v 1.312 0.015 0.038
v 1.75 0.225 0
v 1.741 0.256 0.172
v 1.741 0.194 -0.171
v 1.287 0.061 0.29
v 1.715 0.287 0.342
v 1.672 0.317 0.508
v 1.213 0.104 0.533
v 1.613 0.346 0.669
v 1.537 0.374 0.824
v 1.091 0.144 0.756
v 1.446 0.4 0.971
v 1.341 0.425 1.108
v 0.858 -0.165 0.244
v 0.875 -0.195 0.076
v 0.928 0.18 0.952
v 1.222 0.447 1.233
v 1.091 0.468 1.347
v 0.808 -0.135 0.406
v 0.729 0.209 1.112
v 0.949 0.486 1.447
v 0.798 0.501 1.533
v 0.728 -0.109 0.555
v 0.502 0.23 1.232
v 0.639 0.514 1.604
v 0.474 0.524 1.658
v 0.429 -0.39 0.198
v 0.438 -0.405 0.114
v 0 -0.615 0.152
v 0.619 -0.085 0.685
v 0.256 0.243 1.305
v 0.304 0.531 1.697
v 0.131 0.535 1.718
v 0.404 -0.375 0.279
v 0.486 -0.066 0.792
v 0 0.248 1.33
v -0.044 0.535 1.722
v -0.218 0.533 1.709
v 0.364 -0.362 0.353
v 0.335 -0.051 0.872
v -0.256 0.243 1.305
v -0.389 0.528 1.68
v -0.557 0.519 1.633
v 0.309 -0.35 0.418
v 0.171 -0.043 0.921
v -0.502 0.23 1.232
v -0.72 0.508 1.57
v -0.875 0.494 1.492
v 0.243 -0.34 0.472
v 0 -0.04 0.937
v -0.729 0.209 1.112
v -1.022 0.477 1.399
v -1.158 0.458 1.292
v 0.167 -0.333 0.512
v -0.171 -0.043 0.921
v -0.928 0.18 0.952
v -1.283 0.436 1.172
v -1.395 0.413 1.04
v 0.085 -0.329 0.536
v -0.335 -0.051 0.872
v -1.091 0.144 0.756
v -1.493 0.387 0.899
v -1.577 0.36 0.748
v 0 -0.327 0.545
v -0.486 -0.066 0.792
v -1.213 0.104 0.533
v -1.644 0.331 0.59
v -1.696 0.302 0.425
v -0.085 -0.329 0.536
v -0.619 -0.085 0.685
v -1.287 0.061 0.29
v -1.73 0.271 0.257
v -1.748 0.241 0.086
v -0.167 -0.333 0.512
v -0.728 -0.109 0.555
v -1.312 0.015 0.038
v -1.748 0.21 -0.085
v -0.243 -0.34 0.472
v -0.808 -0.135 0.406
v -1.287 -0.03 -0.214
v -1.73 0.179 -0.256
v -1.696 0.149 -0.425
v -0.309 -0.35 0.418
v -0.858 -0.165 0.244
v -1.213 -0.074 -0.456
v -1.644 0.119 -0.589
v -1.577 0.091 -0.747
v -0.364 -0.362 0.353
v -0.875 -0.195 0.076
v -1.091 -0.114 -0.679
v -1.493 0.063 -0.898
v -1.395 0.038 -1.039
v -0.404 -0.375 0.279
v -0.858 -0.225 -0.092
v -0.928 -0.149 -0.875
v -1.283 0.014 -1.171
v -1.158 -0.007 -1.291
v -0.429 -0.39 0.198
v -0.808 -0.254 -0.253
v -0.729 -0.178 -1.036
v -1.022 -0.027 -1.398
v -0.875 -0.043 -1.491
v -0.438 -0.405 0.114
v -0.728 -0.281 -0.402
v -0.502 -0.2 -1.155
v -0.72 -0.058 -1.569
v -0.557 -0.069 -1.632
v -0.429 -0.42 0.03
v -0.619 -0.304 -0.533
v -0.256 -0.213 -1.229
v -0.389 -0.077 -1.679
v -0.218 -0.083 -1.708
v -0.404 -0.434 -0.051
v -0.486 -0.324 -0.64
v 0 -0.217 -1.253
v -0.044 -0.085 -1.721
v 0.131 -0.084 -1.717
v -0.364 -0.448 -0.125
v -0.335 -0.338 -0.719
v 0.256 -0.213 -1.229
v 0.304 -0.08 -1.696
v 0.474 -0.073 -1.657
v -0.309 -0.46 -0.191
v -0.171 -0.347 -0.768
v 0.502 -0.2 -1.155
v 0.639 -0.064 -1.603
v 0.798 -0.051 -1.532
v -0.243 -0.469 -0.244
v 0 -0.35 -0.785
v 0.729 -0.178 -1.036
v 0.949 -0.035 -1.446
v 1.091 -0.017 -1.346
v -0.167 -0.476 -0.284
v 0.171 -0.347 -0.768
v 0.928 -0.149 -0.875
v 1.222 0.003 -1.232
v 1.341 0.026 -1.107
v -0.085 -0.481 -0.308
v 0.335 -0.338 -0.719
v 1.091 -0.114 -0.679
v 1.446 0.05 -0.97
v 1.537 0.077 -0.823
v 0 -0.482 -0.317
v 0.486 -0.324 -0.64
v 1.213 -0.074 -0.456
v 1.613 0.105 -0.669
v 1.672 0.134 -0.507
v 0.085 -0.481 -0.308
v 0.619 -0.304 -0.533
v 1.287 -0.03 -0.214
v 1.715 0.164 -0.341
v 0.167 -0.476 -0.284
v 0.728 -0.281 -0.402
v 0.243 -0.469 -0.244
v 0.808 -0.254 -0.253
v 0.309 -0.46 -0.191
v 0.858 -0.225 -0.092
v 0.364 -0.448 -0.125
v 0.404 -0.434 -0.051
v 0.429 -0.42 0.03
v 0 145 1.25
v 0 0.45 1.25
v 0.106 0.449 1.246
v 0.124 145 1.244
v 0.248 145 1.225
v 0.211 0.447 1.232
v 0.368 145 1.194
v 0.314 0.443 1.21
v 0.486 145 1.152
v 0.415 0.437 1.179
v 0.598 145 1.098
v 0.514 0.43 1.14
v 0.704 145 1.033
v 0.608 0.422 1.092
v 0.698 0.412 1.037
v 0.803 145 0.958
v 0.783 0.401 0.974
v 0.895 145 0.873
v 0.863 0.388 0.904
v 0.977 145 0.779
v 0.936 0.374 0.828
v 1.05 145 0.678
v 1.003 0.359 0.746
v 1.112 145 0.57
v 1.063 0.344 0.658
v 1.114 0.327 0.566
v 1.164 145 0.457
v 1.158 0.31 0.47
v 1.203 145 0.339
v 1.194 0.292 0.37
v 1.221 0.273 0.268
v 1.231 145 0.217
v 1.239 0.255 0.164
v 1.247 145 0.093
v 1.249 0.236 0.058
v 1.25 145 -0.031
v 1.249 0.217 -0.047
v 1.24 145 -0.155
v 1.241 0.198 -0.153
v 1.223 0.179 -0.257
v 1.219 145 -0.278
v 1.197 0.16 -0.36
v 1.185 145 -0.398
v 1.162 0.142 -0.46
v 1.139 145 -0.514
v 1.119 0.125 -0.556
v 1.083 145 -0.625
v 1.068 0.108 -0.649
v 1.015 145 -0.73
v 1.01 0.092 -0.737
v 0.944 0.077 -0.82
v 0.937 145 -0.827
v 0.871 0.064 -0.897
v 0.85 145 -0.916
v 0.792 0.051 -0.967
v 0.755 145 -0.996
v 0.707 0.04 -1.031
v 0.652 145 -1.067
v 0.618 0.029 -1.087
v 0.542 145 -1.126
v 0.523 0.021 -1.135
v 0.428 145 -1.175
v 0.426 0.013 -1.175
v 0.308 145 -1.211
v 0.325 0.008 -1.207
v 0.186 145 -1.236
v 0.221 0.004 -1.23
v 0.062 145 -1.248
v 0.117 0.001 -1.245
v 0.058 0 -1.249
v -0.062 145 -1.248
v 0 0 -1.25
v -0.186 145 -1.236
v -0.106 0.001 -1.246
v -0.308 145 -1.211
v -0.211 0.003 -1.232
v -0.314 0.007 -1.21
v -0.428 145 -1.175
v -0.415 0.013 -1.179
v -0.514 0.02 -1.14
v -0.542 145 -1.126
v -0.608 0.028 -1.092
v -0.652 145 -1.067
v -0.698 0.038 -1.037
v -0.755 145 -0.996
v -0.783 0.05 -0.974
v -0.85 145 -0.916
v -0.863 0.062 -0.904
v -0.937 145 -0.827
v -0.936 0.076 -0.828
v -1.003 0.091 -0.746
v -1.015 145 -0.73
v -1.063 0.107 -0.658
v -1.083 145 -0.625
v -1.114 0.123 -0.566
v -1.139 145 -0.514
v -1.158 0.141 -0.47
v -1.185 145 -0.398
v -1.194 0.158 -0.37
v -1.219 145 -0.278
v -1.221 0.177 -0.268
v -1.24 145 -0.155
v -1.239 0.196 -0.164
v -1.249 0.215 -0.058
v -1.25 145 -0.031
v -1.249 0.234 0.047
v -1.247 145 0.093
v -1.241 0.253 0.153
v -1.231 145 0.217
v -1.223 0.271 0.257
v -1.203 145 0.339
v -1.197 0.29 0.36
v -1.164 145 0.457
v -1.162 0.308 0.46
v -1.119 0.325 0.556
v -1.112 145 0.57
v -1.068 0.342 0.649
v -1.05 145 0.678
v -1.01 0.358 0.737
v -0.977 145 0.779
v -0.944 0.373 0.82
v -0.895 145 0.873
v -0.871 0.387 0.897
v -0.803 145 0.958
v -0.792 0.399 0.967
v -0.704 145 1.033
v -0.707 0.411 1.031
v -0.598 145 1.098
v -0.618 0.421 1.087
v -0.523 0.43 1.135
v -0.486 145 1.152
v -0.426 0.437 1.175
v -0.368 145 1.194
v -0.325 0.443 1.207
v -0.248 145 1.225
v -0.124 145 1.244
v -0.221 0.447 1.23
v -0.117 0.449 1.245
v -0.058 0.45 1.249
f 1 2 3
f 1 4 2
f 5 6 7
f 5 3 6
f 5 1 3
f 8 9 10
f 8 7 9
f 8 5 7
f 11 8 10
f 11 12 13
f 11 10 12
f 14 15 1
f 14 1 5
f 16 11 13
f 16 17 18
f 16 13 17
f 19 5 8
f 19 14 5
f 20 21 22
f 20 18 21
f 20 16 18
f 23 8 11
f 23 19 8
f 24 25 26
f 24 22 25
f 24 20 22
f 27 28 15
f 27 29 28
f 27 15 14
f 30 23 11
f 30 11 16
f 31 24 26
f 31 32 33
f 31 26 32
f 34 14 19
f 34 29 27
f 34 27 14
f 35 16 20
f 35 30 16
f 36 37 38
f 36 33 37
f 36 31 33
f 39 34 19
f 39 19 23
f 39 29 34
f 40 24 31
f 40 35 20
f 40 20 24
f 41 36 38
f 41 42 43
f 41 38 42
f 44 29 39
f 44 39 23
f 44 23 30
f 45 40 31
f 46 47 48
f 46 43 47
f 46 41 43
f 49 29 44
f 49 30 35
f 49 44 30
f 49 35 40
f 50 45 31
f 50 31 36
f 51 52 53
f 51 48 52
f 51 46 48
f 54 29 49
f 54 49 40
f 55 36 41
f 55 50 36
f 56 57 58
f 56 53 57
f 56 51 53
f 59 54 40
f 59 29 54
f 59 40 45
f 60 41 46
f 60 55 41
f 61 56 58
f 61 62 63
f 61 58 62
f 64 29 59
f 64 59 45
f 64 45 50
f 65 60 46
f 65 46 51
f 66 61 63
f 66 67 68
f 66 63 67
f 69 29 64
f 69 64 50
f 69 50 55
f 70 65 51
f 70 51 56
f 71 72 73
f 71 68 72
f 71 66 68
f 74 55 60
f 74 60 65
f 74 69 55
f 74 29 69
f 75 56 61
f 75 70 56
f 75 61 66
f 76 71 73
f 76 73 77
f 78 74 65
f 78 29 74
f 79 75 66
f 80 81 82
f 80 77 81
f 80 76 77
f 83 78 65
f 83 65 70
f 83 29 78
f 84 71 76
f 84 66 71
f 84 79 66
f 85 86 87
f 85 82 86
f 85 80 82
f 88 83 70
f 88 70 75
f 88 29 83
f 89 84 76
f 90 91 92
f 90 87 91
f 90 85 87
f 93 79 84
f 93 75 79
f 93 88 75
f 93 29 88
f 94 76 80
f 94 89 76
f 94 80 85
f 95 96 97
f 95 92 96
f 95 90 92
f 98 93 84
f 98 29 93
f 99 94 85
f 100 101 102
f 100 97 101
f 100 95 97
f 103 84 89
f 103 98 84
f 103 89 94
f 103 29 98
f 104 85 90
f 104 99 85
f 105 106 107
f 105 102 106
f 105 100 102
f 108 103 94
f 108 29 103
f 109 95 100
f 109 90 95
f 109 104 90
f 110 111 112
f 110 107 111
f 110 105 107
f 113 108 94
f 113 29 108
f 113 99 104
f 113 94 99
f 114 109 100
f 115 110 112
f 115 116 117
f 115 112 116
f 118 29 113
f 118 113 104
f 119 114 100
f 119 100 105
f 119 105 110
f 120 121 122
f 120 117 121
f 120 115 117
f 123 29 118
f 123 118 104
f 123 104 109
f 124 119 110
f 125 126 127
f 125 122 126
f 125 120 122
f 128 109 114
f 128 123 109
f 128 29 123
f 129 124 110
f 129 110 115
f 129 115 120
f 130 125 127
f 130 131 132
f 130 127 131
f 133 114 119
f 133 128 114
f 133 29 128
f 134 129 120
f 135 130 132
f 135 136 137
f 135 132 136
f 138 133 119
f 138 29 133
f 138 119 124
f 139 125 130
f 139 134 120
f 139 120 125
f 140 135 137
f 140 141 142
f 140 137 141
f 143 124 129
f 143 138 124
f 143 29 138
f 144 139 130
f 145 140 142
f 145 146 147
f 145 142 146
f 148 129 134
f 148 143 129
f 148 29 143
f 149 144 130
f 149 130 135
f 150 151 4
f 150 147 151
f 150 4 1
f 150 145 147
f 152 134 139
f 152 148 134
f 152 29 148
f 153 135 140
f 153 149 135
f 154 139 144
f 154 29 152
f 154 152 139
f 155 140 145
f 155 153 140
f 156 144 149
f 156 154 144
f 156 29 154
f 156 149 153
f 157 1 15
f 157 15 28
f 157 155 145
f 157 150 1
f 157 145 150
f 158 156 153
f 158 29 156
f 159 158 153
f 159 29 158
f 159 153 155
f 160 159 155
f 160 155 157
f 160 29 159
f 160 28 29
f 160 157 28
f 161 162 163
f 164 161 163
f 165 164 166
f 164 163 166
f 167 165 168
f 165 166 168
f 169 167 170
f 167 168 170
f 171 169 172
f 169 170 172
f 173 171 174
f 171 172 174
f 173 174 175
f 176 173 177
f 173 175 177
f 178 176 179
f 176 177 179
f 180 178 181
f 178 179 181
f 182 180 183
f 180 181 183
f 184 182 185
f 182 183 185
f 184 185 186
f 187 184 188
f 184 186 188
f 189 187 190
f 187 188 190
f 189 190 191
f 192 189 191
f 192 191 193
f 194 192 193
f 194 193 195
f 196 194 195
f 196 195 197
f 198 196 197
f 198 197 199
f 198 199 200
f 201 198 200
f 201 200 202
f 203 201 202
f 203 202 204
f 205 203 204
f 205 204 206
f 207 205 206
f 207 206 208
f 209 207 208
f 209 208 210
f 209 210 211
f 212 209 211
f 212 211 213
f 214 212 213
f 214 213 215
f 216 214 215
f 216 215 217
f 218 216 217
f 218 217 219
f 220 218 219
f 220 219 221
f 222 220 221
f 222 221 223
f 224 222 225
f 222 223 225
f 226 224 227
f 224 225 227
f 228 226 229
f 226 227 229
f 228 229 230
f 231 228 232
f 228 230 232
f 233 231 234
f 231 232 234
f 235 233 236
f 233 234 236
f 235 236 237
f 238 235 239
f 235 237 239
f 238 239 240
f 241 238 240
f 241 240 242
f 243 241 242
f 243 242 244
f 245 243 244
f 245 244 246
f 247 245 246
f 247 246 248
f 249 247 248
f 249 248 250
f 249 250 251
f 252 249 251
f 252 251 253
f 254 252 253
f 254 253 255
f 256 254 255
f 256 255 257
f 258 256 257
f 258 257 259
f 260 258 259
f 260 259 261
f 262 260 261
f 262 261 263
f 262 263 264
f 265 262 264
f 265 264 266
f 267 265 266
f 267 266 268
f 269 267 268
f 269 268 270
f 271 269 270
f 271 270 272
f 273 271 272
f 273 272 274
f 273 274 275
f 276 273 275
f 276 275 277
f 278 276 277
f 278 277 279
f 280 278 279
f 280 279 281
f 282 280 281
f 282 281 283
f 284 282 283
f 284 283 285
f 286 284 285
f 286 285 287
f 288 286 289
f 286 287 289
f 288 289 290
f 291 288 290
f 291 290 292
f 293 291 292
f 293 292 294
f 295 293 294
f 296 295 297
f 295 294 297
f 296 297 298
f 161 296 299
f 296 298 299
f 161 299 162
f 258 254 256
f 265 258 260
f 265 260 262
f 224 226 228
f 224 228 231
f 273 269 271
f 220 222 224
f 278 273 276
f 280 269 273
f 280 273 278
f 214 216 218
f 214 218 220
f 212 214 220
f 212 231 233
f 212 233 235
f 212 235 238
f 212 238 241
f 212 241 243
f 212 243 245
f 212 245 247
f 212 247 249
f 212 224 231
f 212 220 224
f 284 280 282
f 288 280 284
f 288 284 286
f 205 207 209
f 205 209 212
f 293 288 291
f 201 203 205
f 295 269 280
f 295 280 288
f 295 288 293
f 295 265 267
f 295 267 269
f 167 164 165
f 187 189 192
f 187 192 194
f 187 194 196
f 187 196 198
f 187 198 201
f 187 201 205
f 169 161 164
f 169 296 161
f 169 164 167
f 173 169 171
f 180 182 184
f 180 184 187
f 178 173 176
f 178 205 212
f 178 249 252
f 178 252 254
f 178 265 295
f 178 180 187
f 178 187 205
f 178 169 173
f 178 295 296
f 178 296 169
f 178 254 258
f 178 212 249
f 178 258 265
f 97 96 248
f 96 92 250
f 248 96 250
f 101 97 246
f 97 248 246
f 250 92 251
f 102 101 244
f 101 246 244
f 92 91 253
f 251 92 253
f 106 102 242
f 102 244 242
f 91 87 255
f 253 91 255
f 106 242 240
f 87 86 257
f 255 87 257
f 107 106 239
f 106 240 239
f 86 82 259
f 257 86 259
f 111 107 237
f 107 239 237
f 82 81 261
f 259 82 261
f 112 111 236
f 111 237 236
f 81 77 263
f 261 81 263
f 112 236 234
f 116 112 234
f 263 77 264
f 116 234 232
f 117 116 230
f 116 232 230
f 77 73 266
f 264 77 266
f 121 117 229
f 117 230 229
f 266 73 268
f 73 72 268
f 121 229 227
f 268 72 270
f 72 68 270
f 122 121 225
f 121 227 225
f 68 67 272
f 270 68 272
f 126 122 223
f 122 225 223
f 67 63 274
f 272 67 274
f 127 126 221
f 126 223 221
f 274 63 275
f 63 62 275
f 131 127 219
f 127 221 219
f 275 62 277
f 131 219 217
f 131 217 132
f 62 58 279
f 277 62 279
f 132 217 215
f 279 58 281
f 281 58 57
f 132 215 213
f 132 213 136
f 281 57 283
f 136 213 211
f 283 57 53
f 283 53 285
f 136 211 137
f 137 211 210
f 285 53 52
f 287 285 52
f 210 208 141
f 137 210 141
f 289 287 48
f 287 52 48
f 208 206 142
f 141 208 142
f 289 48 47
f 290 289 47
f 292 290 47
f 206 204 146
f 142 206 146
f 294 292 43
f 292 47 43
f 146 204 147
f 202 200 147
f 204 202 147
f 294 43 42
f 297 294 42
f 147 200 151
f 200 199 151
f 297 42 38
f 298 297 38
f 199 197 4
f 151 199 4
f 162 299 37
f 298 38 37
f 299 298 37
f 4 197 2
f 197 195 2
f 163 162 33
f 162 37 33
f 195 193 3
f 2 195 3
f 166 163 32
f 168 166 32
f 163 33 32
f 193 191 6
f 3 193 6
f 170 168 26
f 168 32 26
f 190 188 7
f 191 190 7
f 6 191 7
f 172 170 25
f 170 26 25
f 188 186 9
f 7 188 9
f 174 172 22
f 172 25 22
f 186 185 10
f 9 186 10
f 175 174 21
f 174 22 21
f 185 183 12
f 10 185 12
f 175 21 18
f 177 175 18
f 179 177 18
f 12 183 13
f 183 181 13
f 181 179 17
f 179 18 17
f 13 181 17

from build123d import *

# Parameters (mm, degrees)
SKETCH_1_R          = 1.25
EXTRUDE_1_DEPTH     = 145
CUT_EXTRUDE_1_DEPTH = 6
SKETCH_4_R          = 1.75
EXTRUDE_3_DEPTH     = 2
EXTRUDE_3_TAPER     = 64


with BuildPart() as part:
    # Эскиз1 → Бобышка-Вытянуть1 (new body)
    with BuildSketch(Plane(origin=(0, 0, 0), x_dir=(1, 0, 0), z_dir=(0, 1, 0))):
        with Locations(Location((0, 0, 0), (0, 0, 270))):
            Circle(SKETCH_1_R)
    extrude(amount=EXTRUDE_1_DEPTH)

    # Эскиз3 → Вырез-Вытянуть1 (cut, symmetric)
    with BuildSketch(Plane(origin=(0, 0, 0), x_dir=(0, 0, -1), z_dir=(1, 0, 0))):
        Polygon((1.25, 0), (-2.080626709, 0.599874475), (-2.080626709, 0), align=None)
    extrude(amount=CUT_EXTRUDE_1_DEPTH, both=True, mode=Mode.SUBTRACT)

    # Эскиз4 → Бобышка-Вытянуть3 (add)
    with BuildSketch(Plane(origin=(0, 0.218062, -0.039274839), x_dir=(1, 0, 0), z_dir=(0, -0.9841646858615077, 0.177256512159977))):
        with Locations((0, 0.040379775)):
            Circle(SKETCH_4_R)
    extrude(amount=EXTRUDE_3_DEPTH, taper=EXTRUDE_3_TAPER)


solid = part.part
